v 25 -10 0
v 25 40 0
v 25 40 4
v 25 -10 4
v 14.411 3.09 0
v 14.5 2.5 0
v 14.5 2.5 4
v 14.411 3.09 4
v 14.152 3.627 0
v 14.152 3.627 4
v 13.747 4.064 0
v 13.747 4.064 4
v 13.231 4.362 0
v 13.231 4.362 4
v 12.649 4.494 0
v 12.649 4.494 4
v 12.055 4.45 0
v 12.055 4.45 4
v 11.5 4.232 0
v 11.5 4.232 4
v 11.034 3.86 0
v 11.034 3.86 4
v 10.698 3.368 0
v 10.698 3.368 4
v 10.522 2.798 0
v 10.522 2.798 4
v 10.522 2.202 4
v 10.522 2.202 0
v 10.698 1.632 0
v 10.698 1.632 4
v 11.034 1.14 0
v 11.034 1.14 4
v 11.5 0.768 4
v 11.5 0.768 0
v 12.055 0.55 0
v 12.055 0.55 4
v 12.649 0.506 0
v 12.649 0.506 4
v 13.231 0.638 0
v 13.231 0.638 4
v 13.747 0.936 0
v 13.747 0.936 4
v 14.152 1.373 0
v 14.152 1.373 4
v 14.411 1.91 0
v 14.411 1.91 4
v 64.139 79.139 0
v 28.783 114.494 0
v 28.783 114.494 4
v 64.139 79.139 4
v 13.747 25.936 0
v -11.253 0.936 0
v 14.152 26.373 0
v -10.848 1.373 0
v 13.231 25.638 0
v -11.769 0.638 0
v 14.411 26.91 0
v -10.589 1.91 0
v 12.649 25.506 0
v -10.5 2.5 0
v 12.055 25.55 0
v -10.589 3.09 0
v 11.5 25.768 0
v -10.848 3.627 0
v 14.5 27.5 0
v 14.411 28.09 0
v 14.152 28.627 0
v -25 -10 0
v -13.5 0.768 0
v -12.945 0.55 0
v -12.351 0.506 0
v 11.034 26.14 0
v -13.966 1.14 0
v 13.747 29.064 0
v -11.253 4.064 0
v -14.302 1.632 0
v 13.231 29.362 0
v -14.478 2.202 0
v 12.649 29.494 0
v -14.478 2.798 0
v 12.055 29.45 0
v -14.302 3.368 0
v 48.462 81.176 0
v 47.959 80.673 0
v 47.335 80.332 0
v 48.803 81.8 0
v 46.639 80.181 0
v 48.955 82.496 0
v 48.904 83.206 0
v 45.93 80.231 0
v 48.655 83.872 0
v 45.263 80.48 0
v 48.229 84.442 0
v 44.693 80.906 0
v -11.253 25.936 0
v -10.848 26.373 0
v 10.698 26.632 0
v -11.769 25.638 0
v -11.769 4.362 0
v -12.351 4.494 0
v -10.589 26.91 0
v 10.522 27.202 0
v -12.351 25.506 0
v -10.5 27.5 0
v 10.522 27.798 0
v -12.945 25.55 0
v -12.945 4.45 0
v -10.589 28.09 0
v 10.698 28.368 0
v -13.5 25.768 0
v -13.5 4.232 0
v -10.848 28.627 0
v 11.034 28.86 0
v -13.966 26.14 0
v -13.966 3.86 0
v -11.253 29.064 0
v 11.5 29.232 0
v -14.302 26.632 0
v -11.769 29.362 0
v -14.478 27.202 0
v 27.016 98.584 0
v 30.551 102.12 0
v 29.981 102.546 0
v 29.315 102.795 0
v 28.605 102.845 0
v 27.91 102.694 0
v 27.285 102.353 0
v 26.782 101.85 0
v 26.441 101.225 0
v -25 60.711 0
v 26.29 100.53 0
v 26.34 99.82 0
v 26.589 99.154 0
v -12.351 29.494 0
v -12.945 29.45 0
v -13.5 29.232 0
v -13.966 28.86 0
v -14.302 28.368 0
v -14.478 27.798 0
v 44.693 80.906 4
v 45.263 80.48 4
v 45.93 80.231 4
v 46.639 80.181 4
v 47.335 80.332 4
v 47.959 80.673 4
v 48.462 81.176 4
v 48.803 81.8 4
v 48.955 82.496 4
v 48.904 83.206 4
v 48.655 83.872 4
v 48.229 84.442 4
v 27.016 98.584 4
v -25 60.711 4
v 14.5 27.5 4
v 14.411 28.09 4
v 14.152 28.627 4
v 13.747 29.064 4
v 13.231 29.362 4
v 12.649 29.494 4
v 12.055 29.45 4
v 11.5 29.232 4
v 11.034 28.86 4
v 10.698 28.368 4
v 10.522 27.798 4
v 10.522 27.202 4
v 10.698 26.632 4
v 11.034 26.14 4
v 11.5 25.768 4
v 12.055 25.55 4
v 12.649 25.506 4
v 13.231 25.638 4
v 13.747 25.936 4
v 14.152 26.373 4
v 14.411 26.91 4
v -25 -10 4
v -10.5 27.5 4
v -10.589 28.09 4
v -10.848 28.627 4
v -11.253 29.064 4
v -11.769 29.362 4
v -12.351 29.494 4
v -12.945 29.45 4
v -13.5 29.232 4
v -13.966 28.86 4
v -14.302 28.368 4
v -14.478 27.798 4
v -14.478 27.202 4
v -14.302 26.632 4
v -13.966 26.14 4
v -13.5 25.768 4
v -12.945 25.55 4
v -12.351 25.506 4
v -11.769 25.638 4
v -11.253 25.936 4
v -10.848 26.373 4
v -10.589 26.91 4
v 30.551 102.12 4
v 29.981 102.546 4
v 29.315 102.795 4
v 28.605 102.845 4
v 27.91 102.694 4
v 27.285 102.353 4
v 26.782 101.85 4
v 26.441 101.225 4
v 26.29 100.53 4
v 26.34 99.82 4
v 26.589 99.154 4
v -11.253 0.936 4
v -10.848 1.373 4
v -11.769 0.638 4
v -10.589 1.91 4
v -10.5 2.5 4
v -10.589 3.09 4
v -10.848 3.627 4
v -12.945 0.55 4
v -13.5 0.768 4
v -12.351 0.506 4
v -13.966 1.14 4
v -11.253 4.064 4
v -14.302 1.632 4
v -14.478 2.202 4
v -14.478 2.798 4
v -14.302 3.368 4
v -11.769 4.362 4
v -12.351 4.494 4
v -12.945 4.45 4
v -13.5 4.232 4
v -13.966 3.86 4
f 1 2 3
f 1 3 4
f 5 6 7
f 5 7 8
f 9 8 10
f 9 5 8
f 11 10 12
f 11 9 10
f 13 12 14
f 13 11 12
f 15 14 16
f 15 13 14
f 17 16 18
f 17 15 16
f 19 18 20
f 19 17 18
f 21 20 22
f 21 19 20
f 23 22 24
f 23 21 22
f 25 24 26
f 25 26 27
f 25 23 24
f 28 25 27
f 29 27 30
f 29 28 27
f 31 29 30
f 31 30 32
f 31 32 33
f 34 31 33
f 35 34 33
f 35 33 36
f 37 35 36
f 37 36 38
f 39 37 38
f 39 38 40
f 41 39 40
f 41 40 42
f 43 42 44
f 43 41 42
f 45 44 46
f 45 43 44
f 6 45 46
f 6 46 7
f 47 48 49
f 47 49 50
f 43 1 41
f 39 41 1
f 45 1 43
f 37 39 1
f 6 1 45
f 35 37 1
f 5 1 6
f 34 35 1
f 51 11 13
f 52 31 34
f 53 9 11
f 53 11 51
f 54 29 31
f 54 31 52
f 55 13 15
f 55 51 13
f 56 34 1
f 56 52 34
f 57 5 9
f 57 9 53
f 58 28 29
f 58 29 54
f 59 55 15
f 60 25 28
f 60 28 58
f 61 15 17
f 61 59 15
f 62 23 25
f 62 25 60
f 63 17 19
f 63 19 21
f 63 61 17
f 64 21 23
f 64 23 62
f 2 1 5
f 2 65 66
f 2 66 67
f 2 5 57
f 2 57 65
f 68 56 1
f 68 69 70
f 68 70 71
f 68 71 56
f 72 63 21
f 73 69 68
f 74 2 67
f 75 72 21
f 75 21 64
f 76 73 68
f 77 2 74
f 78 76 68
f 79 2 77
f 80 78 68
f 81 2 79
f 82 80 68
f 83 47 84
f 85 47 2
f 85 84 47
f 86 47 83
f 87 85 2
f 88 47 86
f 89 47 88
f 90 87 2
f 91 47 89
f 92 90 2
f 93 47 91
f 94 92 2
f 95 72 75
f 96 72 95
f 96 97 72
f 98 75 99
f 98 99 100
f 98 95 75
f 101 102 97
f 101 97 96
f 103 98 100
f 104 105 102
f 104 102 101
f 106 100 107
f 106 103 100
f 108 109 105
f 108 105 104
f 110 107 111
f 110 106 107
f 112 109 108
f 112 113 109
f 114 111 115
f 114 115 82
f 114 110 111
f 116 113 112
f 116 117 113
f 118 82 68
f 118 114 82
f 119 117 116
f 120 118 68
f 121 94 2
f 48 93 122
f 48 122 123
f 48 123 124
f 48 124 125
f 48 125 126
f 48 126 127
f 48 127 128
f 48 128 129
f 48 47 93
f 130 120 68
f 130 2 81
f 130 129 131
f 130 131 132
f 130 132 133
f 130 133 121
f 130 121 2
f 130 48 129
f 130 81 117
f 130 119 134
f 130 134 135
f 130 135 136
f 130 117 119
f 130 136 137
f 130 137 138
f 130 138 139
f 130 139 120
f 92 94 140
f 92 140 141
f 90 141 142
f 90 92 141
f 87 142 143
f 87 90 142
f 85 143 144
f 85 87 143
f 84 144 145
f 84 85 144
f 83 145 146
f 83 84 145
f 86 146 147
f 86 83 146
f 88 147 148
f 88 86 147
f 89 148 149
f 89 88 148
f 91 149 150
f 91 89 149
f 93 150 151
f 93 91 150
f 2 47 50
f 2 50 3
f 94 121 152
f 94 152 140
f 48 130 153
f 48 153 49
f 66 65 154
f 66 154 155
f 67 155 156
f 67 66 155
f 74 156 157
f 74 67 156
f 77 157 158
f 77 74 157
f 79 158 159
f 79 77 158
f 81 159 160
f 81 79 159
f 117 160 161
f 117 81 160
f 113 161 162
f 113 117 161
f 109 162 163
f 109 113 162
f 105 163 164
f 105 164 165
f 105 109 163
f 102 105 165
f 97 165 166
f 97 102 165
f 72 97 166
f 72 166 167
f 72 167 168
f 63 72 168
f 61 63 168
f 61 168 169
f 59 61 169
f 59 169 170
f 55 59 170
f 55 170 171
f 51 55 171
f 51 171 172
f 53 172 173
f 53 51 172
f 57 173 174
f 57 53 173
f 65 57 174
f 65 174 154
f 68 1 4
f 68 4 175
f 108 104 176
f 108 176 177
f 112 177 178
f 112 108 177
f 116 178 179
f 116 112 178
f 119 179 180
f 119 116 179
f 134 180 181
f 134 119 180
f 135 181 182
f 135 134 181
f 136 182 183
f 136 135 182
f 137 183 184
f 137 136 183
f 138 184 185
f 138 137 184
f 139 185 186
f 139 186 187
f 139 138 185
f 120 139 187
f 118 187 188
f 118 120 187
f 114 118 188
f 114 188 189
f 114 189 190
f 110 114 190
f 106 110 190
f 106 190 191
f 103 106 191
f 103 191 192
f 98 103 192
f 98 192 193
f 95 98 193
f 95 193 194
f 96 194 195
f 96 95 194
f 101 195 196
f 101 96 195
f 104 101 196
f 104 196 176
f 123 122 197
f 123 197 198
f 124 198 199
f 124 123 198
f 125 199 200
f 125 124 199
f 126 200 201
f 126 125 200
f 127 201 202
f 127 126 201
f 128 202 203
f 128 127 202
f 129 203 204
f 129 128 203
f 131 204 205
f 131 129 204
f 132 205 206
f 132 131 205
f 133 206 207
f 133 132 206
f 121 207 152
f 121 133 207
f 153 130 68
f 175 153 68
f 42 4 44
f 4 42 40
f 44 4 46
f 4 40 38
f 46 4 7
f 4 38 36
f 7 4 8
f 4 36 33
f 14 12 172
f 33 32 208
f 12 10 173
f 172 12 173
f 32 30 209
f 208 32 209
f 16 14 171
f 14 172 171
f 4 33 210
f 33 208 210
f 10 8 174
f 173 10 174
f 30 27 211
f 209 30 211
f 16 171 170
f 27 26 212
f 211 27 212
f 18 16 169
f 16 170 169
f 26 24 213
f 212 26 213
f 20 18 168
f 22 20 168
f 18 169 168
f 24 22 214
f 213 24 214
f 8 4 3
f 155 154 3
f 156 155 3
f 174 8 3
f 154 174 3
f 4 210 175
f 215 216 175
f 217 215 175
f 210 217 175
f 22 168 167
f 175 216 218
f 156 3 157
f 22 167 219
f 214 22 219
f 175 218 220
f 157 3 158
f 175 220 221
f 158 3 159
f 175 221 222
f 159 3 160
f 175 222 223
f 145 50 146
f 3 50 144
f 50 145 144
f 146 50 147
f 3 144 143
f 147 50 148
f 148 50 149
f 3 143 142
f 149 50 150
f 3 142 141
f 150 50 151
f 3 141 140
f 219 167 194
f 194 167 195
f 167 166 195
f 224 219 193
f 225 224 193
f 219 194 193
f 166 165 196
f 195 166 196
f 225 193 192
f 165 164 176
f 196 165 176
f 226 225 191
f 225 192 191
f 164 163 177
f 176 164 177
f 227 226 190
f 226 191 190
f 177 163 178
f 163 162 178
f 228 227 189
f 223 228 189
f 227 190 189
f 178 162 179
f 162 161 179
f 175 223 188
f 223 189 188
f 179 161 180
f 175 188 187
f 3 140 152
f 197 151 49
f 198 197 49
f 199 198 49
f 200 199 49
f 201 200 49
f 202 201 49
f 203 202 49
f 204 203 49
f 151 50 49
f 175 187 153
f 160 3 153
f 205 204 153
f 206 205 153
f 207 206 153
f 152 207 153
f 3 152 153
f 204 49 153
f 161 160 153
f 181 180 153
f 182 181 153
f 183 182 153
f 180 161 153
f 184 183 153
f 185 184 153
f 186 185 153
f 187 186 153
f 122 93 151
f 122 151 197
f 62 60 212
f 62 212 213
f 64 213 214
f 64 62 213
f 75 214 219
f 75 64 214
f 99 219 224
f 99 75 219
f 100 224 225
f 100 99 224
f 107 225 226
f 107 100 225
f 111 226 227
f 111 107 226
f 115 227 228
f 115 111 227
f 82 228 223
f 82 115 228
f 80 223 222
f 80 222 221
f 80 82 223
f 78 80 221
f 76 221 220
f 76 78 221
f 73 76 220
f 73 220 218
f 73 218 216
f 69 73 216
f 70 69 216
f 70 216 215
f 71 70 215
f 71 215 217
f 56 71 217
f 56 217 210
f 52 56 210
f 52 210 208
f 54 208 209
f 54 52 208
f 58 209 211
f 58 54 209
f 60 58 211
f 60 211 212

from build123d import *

# Parameters (mm, degrees)
SKETCH1_R           = 2
BOSS_EXTRUDE1_DEPTH = 4


with BuildPart() as part:
    # Sketch1 → Boss-Extrude1 (new body)
    with BuildSketch(Plane.XY):
        Polygon((28.783278196, 114.493956315), (64.138617256, 79.138617256), (25, 40), (25, -10), (-25, -10), (-25, 40), (-25, 60.710678119), align=None)
        with Locations((-12.5, 27.5)):
            Circle(SKETCH1_R, mode=Mode.SUBTRACT)
        with Locations((12.5, 27.5)):
            Circle(SKETCH1_R, mode=Mode.SUBTRACT)
        with Locations((12.5, 2.5)):
            Circle(SKETCH1_R, mode=Mode.SUBTRACT)
        with Locations((-12.5, 2.5)):
            Circle(SKETCH1_R, mode=Mode.SUBTRACT)
        with BuildLine():
            Line((48.228714679, 84.441918115), (30.551045149, 102.119587644))
            ThreePointArc((30.551045149, 102.119587644), (27.015511244, 102.119587644), (27.015511244, 98.584053738))
            Line((27.015511244, 98.584053738), (44.693180773, 80.906384209))
            ThreePointArc((44.693180773, 80.906384209), (48.228714679, 80.906384209), (48.228714679, 84.441918115))
        make_face(mode=Mode.SUBTRACT)
    extrude(amount=BOSS_EXTRUDE1_DEPTH)


solid = part.part
